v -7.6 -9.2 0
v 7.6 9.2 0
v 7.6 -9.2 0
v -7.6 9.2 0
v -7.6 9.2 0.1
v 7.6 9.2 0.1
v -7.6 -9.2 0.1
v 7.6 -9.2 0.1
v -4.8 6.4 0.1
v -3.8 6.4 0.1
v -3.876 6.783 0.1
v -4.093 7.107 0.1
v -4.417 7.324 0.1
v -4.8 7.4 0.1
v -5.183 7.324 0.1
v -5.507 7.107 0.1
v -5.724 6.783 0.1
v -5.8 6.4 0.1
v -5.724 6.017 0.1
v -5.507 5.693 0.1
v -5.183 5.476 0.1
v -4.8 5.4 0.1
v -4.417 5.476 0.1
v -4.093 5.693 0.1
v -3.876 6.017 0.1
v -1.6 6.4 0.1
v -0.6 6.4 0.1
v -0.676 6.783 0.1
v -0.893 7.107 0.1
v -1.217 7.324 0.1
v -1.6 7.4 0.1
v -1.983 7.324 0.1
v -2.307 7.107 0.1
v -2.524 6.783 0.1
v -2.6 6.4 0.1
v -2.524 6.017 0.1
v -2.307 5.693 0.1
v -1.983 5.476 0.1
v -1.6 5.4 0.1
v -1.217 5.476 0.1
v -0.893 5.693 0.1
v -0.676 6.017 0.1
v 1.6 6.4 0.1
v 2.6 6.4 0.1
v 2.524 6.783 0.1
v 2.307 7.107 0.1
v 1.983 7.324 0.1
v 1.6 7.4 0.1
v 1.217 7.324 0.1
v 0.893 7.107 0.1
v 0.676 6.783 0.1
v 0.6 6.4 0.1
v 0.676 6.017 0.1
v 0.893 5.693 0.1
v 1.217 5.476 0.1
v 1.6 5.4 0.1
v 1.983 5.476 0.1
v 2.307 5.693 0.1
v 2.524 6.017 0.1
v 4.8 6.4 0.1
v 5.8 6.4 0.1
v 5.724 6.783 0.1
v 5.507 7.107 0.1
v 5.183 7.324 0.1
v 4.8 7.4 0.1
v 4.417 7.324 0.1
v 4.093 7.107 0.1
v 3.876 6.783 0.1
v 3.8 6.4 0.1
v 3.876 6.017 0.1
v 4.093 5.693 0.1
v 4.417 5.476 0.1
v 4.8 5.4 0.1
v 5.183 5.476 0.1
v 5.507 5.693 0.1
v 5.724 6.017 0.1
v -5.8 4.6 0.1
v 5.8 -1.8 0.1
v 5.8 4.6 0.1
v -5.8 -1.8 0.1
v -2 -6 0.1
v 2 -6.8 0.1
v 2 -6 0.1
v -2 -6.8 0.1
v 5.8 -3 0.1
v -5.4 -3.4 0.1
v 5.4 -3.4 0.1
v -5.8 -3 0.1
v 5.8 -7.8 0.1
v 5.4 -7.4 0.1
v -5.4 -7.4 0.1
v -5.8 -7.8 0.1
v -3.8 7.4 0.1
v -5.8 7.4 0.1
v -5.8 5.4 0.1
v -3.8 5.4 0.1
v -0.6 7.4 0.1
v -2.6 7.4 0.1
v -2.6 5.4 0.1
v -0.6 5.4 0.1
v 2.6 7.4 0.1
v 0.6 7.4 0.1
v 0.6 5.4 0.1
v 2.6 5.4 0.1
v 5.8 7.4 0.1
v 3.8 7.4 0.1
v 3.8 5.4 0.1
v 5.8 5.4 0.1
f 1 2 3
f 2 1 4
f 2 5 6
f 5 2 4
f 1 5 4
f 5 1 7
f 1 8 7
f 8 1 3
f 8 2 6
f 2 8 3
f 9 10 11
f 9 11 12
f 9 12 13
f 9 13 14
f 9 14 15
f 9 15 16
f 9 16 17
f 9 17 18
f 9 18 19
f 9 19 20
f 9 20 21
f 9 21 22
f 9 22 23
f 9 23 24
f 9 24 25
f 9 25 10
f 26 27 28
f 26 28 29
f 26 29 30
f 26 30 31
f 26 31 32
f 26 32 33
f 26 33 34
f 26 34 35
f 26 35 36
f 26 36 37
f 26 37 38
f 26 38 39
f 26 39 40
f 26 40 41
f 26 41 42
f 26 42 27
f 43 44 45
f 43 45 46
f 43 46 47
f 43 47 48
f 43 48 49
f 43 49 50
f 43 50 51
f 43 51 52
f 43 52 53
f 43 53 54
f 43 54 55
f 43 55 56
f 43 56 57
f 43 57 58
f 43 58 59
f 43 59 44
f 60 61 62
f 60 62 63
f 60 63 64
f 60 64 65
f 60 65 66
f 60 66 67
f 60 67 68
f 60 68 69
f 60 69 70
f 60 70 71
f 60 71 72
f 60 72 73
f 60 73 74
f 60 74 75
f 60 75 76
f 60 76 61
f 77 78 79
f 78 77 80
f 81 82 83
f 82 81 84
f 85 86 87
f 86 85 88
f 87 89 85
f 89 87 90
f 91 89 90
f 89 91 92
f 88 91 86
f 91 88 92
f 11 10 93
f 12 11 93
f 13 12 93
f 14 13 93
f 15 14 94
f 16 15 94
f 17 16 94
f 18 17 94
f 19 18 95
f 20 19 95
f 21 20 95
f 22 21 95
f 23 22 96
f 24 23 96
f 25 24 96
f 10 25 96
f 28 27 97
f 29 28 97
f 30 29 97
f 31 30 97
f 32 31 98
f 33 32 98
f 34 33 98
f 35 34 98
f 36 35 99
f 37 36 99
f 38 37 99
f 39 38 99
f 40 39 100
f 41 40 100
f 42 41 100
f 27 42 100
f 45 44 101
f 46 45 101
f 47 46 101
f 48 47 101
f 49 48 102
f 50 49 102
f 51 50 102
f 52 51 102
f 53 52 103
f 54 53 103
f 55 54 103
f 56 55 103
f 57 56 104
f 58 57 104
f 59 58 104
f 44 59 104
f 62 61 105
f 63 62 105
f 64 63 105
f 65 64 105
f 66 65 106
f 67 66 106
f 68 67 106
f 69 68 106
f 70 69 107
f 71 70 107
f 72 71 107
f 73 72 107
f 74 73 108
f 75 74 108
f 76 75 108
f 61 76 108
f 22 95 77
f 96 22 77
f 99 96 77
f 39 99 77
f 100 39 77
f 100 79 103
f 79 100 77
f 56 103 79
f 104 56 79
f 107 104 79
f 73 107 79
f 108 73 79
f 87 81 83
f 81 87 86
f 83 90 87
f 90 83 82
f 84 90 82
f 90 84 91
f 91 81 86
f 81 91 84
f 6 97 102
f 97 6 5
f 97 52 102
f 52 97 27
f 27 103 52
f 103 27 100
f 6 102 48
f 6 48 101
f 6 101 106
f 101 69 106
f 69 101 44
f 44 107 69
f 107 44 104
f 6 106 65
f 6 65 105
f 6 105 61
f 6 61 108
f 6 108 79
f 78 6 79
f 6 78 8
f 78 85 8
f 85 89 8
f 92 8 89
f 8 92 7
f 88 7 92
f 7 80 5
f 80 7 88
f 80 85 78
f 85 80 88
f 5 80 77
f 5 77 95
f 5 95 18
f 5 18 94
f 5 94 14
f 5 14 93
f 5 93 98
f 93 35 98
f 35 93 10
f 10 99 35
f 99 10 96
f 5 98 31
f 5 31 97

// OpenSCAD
// file: ../p/box5-12.scad
use <../lib.scad>
function ldraw_lib__box5_12() = [
// 0 Box with 5 Faces without Any Edges
// 0 Name: box5-12.dat
// 0 Author: Chris Dee [cwdee]
// 0 !LDRAW_ORG Primitive UPDATE 2009-02
// 0 !LICENSE Licensed under CC BY 4.0 : see CAreadme.txt
// 
// 0 BFC CERTIFY CCW
  [0,"BFC","CERTIFY"],
  [0,"BFC","CCW"],
// 
// 0 !HISTORY 2009-09-03 [PTadmin] Official Update 2009-02
// 
// 
// 4 16 1 1 1 1 1 -1 -1 1 -1 -1 1 1
  [4,16,1,1,1,1,1,-1,-1,1,-1,-1,1,1],
// 4 16 -1 0 1 1 0 1 1 1 1 -1 1 1
  [4,16,-1,0,1,1,0,1,1,1,1,-1,1,1],
// 4 16 -1 0 -1 -1 0 1 -1 1 1 -1 1 -1
  [4,16,-1,0,-1,-1,0,1,-1,1,1,-1,1,-1],
// 4 16 1 0 -1 -1 0 -1 -1 1 -1 1 1 -1
  [4,16,1,0,-1,-1,0,-1,-1,1,-1,1,1,-1],
// 4 16 1 0 1 1 0 -1 1 1 -1 1 1 1
  [4,16,1,0,1,1,0,-1,1,1,-1,1,1,1],
// 0
];
module ldraw_lib__box5_12(step=0, col=false, unit=2/5, alt=false, line=0.2, solid=!$preview)
    makepoly(ldraw_lib__box5_12(), step=step, col=col, unit=unit, alt=alt, line=line, solid=solid);
ldraw_lib__box5_12(line=0.2);
// file: ../p/4-4ndis.scad
use <../lib.scad>
function ldraw_lib__4_4ndis() = [
// 0 Disc Negative 1.0
// 0 Name: 4-4ndis.dat
// 0 Author: James Jessiman
// 0 !LDRAW_ORG Primitive UPDATE 2012-01
// 0 !LICENSE Licensed under CC BY 4.0 : see CAreadme.txt
// 
// 0 BFC CERTIFY CCW
  [0,"BFC","CERTIFY"],
  [0,"BFC","CCW"],
// 
// 0 !HISTORY 2002-03-23 [sbliss] Added BFC statement; compacted code
// 0 !HISTORY 2002-04-25 [PTadmin] Official Update 2002-02
// 0 !HISTORY 2007-06-24 [PTadmin] Header formatted for Contributor Agreement
// 0 !HISTORY 2008-07-01 [PTadmin] Official Update 2008-01
// 0 !HISTORY 2012-02-16 [Philo] Changed to CCW
// 0 !HISTORY 2012-03-30 [PTadmin] Official Update 2012-01
// 
// 
// 3 16 0.9239 0 0.3827 1 0 0 1 0 1
  [3,16,0.9239,0,0.3827,1,0,0,1,0,1],
// 3 16 0.7071 0 0.7071 0.9239 0 0.3827 1 0 1
  [3,16,0.7071,0,0.7071,0.9239,0,0.3827,1,0,1],
// 3 16 0.3827 0 0.9239 0.7071 0 0.7071 1 0 1
  [3,16,0.3827,0,0.9239,0.7071,0,0.7071,1,0,1],
// 3 16 0 0 1 0.3827 0 0.9239 1 0 1
  [3,16,0,0,1,0.3827,0,0.9239,1,0,1],
// 3 16 -0.3827 0 0.9239 0 0 1 -1 0 1
  [3,16,-0.3827,0,0.9239,0,0,1,-1,0,1],
// 3 16 -0.7071 0 0.7071 -0.3827 0 0.9239 -1 0 1
  [3,16,-0.7071,0,0.7071,-0.3827,0,0.9239,-1,0,1],
// 3 16 -0.9239 0 0.3827 -0.7071 0 0.7071 -1 0 1
  [3,16,-0.9239,0,0.3827,-0.7071,0,0.7071,-1,0,1],
// 3 16 -1 0 0 -0.9239 0 0.3827 -1 0 1
  [3,16,-1,0,0,-0.9239,0,0.3827,-1,0,1],
// 3 16 -0.9239 0 -0.3827 -1 0 0 -1 0 -1
  [3,16,-0.9239,0,-0.3827,-1,0,0,-1,0,-1],
// 3 16 -0.7071 0 -0.7071 -0.9239 0 -0.3827 -1 0 -1
  [3,16,-0.7071,0,-0.7071,-0.9239,0,-0.3827,-1,0,-1],
// 3 16 -0.3827 0 -0.9239 -0.7071 0 -0.7071 -1 0 -1
  [3,16,-0.3827,0,-0.9239,-0.7071,0,-0.7071,-1,0,-1],
// 3 16 0 0 -1 -0.3827 0 -0.9239 -1 0 -1
  [3,16,0,0,-1,-0.3827,0,-0.9239,-1,0,-1],
// 3 16 0.3827 0 -0.9239 0 0 -1 1 0 -1
  [3,16,0.3827,0,-0.9239,0,0,-1,1,0,-1],
// 3 16 0.7071 0 -0.7071 0.3827 0 -0.9239 1 0 -1
  [3,16,0.7071,0,-0.7071,0.3827,0,-0.9239,1,0,-1],
// 3 16 0.9239 0 -0.3827 0.7071 0 -0.7071 1 0 -1
  [3,16,0.9239,0,-0.3827,0.7071,0,-0.7071,1,0,-1],
// 3 16 1 0 0 0.9239 0 -0.3827 1 0 -1
  [3,16,1,0,0,0.9239,0,-0.3827,1,0,-1],
];
module ldraw_lib__4_4ndis(step=0, col=false, unit=2/5, alt=false, line=0.2, solid=!$preview)
    makepoly(ldraw_lib__4_4ndis(), step=step, col=col, unit=unit, alt=alt, line=line, solid=solid);
ldraw_lib__4_4ndis(line=0.2);
// file: ../p/4-4disc.scad
use <../lib.scad>
function ldraw_lib__4_4disc() = [
// 0 Disc 1.0
// 0 Name: 4-4disc.dat
// 0 Author: James Jessiman
// 0 !LDRAW_ORG Primitive UPDATE 2002-02
// 0 !LICENSE Licensed under CC BY 4.0 : see CAreadme.txt
// 
// 0 BFC CERTIFY CCW
  [0,"BFC","CERTIFY"],
  [0,"BFC","CCW"],
// 
// 0 !HISTORY 1998-12-15 [PTadmin] Official Update 1998-10
// 0 !HISTORY 2002-03-23 [sbliss] Added BFC statement
// 0 !HISTORY 2002-04-25 [PTadmin] Official Update 2002-02
// 0 !HISTORY 2007-06-24 [PTadmin] Header formatted for Contributor Agreement
// 0 !HISTORY 2008-07-01 [PTadmin] Official Update 2008-01
// 
// 
// 3 16 0 0 0 1 0 0 0.9239 0 0.3827
  [3,16,0,0,0,1,0,0,0.9239,0,0.3827],
// 3 16 0 0 0 0.9239 0 0.3827 0.7071 0 0.7071
  [3,16,0,0,0,0.9239,0,0.3827,0.7071,0,0.7071],
// 3 16 0 0 0 0.7071 0 0.7071 0.3827 0 0.9239
  [3,16,0,0,0,0.7071,0,0.7071,0.3827,0,0.9239],
// 3 16 0 0 0 0.3827 0 0.9239 0 0 1
  [3,16,0,0,0,0.3827,0,0.9239,0,0,1],
// 3 16 0 0 0 0 0 1 -0.3827 0 0.9239
  [3,16,0,0,0,0,0,1,-0.3827,0,0.9239],
// 3 16 0 0 0 -0.3827 0 0.9239 -0.7071 0 0.7071
  [3,16,0,0,0,-0.3827,0,0.9239,-0.7071,0,0.7071],
// 3 16 0 0 0 -0.7071 0 0.7071 -0.9239 0 0.3827
  [3,16,0,0,0,-0.7071,0,0.7071,-0.9239,0,0.3827],
// 3 16 0 0 0 -0.9239 0 0.3827 -1 0 -0
  [3,16,0,0,0,-0.9239,0,0.3827,-1,0,-0],
// 3 16 0 0 0 -1 0 -0 -0.9239 0 -0.3827
  [3,16,0,0,0,-1,0,-0,-0.9239,0,-0.3827],
// 3 16 0 0 0 -0.9239 0 -0.3827 -0.7071 0 -0.7071
  [3,16,0,0,0,-0.9239,0,-0.3827,-0.7071,0,-0.7071],
// 3 16 0 0 0 -0.7071 0 -0.7071 -0.3827 0 -0.9239
  [3,16,0,0,0,-0.7071,0,-0.7071,-0.3827,0,-0.9239],
// 3 16 0 0 0 -0.3827 0 -0.9239 0 0 -1
  [3,16,0,0,0,-0.3827,0,-0.9239,0,0,-1],
// 3 16 0 0 0 0 0 -1 0.3827 0 -0.9239
  [3,16,0,0,0,0,0,-1,0.3827,0,-0.9239],
// 3 16 0 0 0 0.3827 0 -0.9239 0.7071 0 -0.7071
  [3,16,0,0,0,0.3827,0,-0.9239,0.7071,0,-0.7071],
// 3 16 0 0 0 0.7071 0 -0.7071 0.9239 0 -0.3827
  [3,16,0,0,0,0.7071,0,-0.7071,0.9239,0,-0.3827],
// 3 16 0 0 0 0.9239 0 -0.3827 1 0 0
  [3,16,0,0,0,0.9239,0,-0.3827,1,0,0],
// 0
];
module ldraw_lib__4_4disc(step=0, col=false, unit=2/5, alt=false, line=0.2, solid=!$preview)
    makepoly(ldraw_lib__4_4disc(), step=step, col=col, unit=unit, alt=alt, line=line, solid=solid);
ldraw_lib__4_4disc(line=0.2);
// main file
use <../lib.scad>
use <../p/4-4disc.scad>
use <../p/4-4ndis.scad>
use <../p/box5-12.scad>
function ldraw_lib__195375c() = [
// 0 Sticker  2.3 x  1.9 with Oven on Transparent Background
// 0 Name: 195375c.dat
// 0 Author: Takeshi Takahashi [RainbowDolphin]
// 0 !LDRAW_ORG Part UPDATE 2024-11
// 0 !LICENSE Licensed under CC BY 4.0 : see CAreadme.txt
// 
// 0 BFC CERTIFY CCW
  [0,"BFC","CERTIFY"],
  [0,"BFC","CCW"],
// 
// 0 !KEYWORDS Kitchen, Set 6374
// 
// 0 !HISTORY 2024-12-30 [OrionP] Official Update 2024-11
// 
// 
// 1 16 0 -0.25 0 19 0 0 0 0.25 0 0 0 23 box5-12.dat
  [1,16,0,-0.25,0,19,0,0,0,0.25,0,0,0,23, ldraw_lib__box5_12()],
// 0 BFC NOCLIP
  [0,"BFC","NOCLIP"],
// 1 0 -12 -0.25 16 2.5 0 0 0 1 0 0 0 2.5 4-4disc.dat
  [1,0,-12,-0.25,16,2.5,0,0,0,1,0,0,0,2.5, ldraw_lib__4_4disc()],
// 1 0 -4 -0.25 16 2.5 0 0 0 1 0 0 0 2.5 4-4disc.dat
  [1,0,-4,-0.25,16,2.5,0,0,0,1,0,0,0,2.5, ldraw_lib__4_4disc()],
// 1 0 4 -0.25 16 2.5 0 0 0 1 0 0 0 2.5 4-4disc.dat
  [1,0,4,-0.25,16,2.5,0,0,0,1,0,0,0,2.5, ldraw_lib__4_4disc()],
// 1 0 12 -0.25 16 2.5 0 0 0 1 0 0 0 2.5 4-4disc.dat
  [1,0,12,-0.25,16,2.5,0,0,0,1,0,0,0,2.5, ldraw_lib__4_4disc()],
// 4 0 14.5 -0.25 11.5 -14.5 -0.25 11.5 -14.5 -0.25 -4.5 14.5 -0.25 -4.5
  [4,0,14.5,-0.25,11.5,-14.5,-0.25,11.5,-14.5,-0.25,-4.5,14.5,-0.25,-4.5],
// 4 0 5 -0.25 -15 -5 -0.25 -15 -5 -0.25 -17 5 -0.25 -17
  [4,0,5,-0.25,-15,-5,-0.25,-15,-5,-0.25,-17,5,-0.25,-17],
// 4 0 14.5 -0.25 -7.5 -14.5 -0.25 -7.5 -13.5 -0.25 -8.5 13.5 -0.25 -8.5
  [4,0,14.5,-0.25,-7.5,-14.5,-0.25,-7.5,-13.5,-0.25,-8.5,13.5,-0.25,-8.5],
// 4 0 14.5 -0.25 -19.5 14.5 -0.25 -7.5 13.5 -0.25 -8.5 13.5 -0.25 -18.5
  [4,0,14.5,-0.25,-19.5,14.5,-0.25,-7.5,13.5,-0.25,-8.5,13.5,-0.25,-18.5],
// 4 0 -14.5 -0.25 -19.5 14.5 -0.25 -19.5 13.5 -0.25 -18.5 -13.5 -0.25 -18.5
  [4,0,-14.5,-0.25,-19.5,14.5,-0.25,-19.5,13.5,-0.25,-18.5,-13.5,-0.25,-18.5],
// 4 0 -14.5 -0.25 -7.5 -14.5 -0.25 -19.5 -13.5 -0.25 -18.5 -13.5 -0.25 -8.5
  [4,0,-14.5,-0.25,-7.5,-14.5,-0.25,-19.5,-13.5,-0.25,-18.5,-13.5,-0.25,-8.5],
// 0 BFC CLIP
  [0,"BFC","CLIP"],
// 1 16 -12 -0.25 16 2.5 0 0 0 1 0 0 0 2.5 4-4ndis.dat
  [1,16,-12,-0.25,16,2.5,0,0,0,1,0,0,0,2.5, ldraw_lib__4_4ndis()],
// 1 16 -4 -0.25 16 2.5 0 0 0 1 0 0 0 2.5 4-4ndis.dat
  [1,16,-4,-0.25,16,2.5,0,0,0,1,0,0,0,2.5, ldraw_lib__4_4ndis()],
// 1 16 4 -0.25 16 2.5 0 0 0 1 0 0 0 2.5 4-4ndis.dat
  [1,16,4,-0.25,16,2.5,0,0,0,1,0,0,0,2.5, ldraw_lib__4_4ndis()],
// 1 16 12 -0.25 16 2.5 0 0 0 1 0 0 0 2.5 4-4ndis.dat
  [1,16,12,-0.25,16,2.5,0,0,0,1,0,0,0,2.5, ldraw_lib__4_4ndis()],
// 3 16 -12 -0.25 13.5 -14.5 -0.25 13.5 -14.5 -0.25 11.5
  [3,16,-12,-0.25,13.5,-14.5,-0.25,13.5,-14.5,-0.25,11.5],
// 3 16 -9.5 -0.25 13.5 -12 -0.25 13.5 -14.5 -0.25 11.5
  [3,16,-9.5,-0.25,13.5,-12,-0.25,13.5,-14.5,-0.25,11.5],
// 3 16 -6.5 -0.25 13.5 -9.5 -0.25 13.5 -14.5 -0.25 11.5
  [3,16,-6.5,-0.25,13.5,-9.5,-0.25,13.5,-14.5,-0.25,11.5],
// 3 16 -4 -0.25 13.5 -6.5 -0.25 13.5 -14.5 -0.25 11.5
  [3,16,-4,-0.25,13.5,-6.5,-0.25,13.5,-14.5,-0.25,11.5],
// 3 16 -1.5 -0.25 13.5 -4 -0.25 13.5 -14.5 -0.25 11.5
  [3,16,-1.5,-0.25,13.5,-4,-0.25,13.5,-14.5,-0.25,11.5],
// 4 16 1.5 -0.25 13.5 -1.5 -0.25 13.5 -14.5 -0.25 11.5 14.5 -0.25 11.5
  [4,16,1.5,-0.25,13.5,-1.5,-0.25,13.5,-14.5,-0.25,11.5,14.5,-0.25,11.5],
// 3 16 4 -0.25 13.5 1.5 -0.25 13.5 14.5 -0.25 11.5
  [3,16,4,-0.25,13.5,1.5,-0.25,13.5,14.5,-0.25,11.5],
// 3 16 6.5 -0.25 13.5 4 -0.25 13.5 14.5 -0.25 11.5
  [3,16,6.5,-0.25,13.5,4,-0.25,13.5,14.5,-0.25,11.5],
// 3 16 9.5 -0.25 13.5 6.5 -0.25 13.5 14.5 -0.25 11.5
  [3,16,9.5,-0.25,13.5,6.5,-0.25,13.5,14.5,-0.25,11.5],
// 3 16 12 -0.25 13.5 9.5 -0.25 13.5 14.5 -0.25 11.5
  [3,16,12,-0.25,13.5,9.5,-0.25,13.5,14.5,-0.25,11.5],
// 3 16 14.5 -0.25 13.5 12 -0.25 13.5 14.5 -0.25 11.5
  [3,16,14.5,-0.25,13.5,12,-0.25,13.5,14.5,-0.25,11.5],
// 4 16 13.5 -0.25 -8.5 -13.5 -0.25 -8.5 -5 -0.25 -15 5 -0.25 -15
  [4,16,13.5,-0.25,-8.5,-13.5,-0.25,-8.5,-5,-0.25,-15,5,-0.25,-15],
// 4 16 13.5 -0.25 -8.5 5 -0.25 -15 5 -0.25 -17 13.5 -0.25 -18.5
  [4,16,13.5,-0.25,-8.5,5,-0.25,-15,5,-0.25,-17,13.5,-0.25,-18.5],
// 4 16 13.5 -0.25 -18.5 5 -0.25 -17 -5 -0.25 -17 -13.5 -0.25 -18.5
  [4,16,13.5,-0.25,-18.5,5,-0.25,-17,-5,-0.25,-17,-13.5,-0.25,-18.5],
// 4 16 -13.5 -0.25 -8.5 -13.5 -0.25 -18.5 -5 -0.25 -17 -5 -0.25 -15
  [4,16,-13.5,-0.25,-8.5,-13.5,-0.25,-18.5,-5,-0.25,-17,-5,-0.25,-15],
// 4 16 19 -0.25 23 -19 -0.25 23 -1.5 -0.25 18.5 1.5 -0.25 18.5
  [4,16,19,-0.25,23,-19,-0.25,23,-1.5,-0.25,18.5,1.5,-0.25,18.5],
// 4 16 1.5 -0.25 18.5 -1.5 -0.25 18.5 -1.5 -0.25 16 1.5 -0.25 16
  [4,16,1.5,-0.25,18.5,-1.5,-0.25,18.5,-1.5,-0.25,16,1.5,-0.25,16],
// 4 16 1.5 -0.25 16 -1.5 -0.25 16 -1.5 -0.25 13.5 1.5 -0.25 13.5
  [4,16,1.5,-0.25,16,-1.5,-0.25,16,-1.5,-0.25,13.5,1.5,-0.25,13.5],
// 3 16 19 -0.25 23 1.5 -0.25 18.5 4 -0.25 18.5
  [3,16,19,-0.25,23,1.5,-0.25,18.5,4,-0.25,18.5],
// 3 16 19 -0.25 23 4 -0.25 18.5 6.5 -0.25 18.5
  [3,16,19,-0.25,23,4,-0.25,18.5,6.5,-0.25,18.5],
// 3 16 19 -0.25 23 6.5 -0.25 18.5 9.5 -0.25 18.5
  [3,16,19,-0.25,23,6.5,-0.25,18.5,9.5,-0.25,18.5],
// 4 16 9.5 -0.25 18.5 6.5 -0.25 18.5 6.5 -0.25 16 9.5 -0.25 16
  [4,16,9.5,-0.25,18.5,6.5,-0.25,18.5,6.5,-0.25,16,9.5,-0.25,16],
// 4 16 9.5 -0.25 16 6.5 -0.25 16 6.5 -0.25 13.5 9.5 -0.25 13.5
  [4,16,9.5,-0.25,16,6.5,-0.25,16,6.5,-0.25,13.5,9.5,-0.25,13.5],
// 3 16 19 -0.25 23 9.5 -0.25 18.5 12 -0.25 18.5
  [3,16,19,-0.25,23,9.5,-0.25,18.5,12,-0.25,18.5],
// 3 16 19 -0.25 23 12 -0.25 18.5 14.5 -0.25 18.5
  [3,16,19,-0.25,23,12,-0.25,18.5,14.5,-0.25,18.5],
// 3 16 19 -0.25 23 14.5 -0.25 18.5 14.5 -0.25 16
  [3,16,19,-0.25,23,14.5,-0.25,18.5,14.5,-0.25,16],
// 3 16 19 -0.25 23 14.5 -0.25 16 14.5 -0.25 13.5
  [3,16,19,-0.25,23,14.5,-0.25,16,14.5,-0.25,13.5],
// 3 16 19 -0.25 23 14.5 -0.25 13.5 14.5 -0.25 11.5
  [3,16,19,-0.25,23,14.5,-0.25,13.5,14.5,-0.25,11.5],
// 4 16 19 -0.25 23 14.5 -0.25 11.5 14.5 -0.25 -4.5 19 -0.25 -23
  [4,16,19,-0.25,23,14.5,-0.25,11.5,14.5,-0.25,-4.5,19,-0.25,-23],
// 3 16 14.5 -0.25 -4.5 14.5 -0.25 -7.5 19 -0.25 -23
  [3,16,14.5,-0.25,-4.5,14.5,-0.25,-7.5,19,-0.25,-23],
// 3 16 14.5 -0.25 -7.5 14.5 -0.25 -19.5 19 -0.25 -23
  [3,16,14.5,-0.25,-7.5,14.5,-0.25,-19.5,19,-0.25,-23],
// 4 16 19 -0.25 -23 14.5 -0.25 -19.5 -14.5 -0.25 -19.5 -19 -0.25 -23
  [4,16,19,-0.25,-23,14.5,-0.25,-19.5,-14.5,-0.25,-19.5,-19,-0.25,-23],
// 3 16 -14.5 -0.25 -7.5 -19 -0.25 -23 -14.5 -0.25 -19.5
  [3,16,-14.5,-0.25,-7.5,-19,-0.25,-23,-14.5,-0.25,-19.5],
// 4 16 -19 -0.25 -23 -14.5 -0.25 -7.5 -14.5 -0.25 -4.5 -19 -0.25 23
  [4,16,-19,-0.25,-23,-14.5,-0.25,-7.5,-14.5,-0.25,-4.5,-19,-0.25,23],
// 4 16 14.5 -0.25 -4.5 -14.5 -0.25 -4.5 -14.5 -0.25 -7.5 14.5 -0.25 -7.5
  [4,16,14.5,-0.25,-4.5,-14.5,-0.25,-4.5,-14.5,-0.25,-7.5,14.5,-0.25,-7.5],
// 3 16 -19 -0.25 23 -14.5 -0.25 -4.5 -14.5 -0.25 11.5
  [3,16,-19,-0.25,23,-14.5,-0.25,-4.5,-14.5,-0.25,11.5],
// 3 16 -19 -0.25 23 -14.5 -0.25 11.5 -14.5 -0.25 13.5
  [3,16,-19,-0.25,23,-14.5,-0.25,11.5,-14.5,-0.25,13.5],
// 3 16 -19 -0.25 23 -14.5 -0.25 13.5 -14.5 -0.25 16
  [3,16,-19,-0.25,23,-14.5,-0.25,13.5,-14.5,-0.25,16],
// 3 16 -19 -0.25 23 -14.5 -0.25 16 -14.5 -0.25 18.5
  [3,16,-19,-0.25,23,-14.5,-0.25,16,-14.5,-0.25,18.5],
// 3 16 -19 -0.25 23 -14.5 -0.25 18.5 -12 -0.25 18.5
  [3,16,-19,-0.25,23,-14.5,-0.25,18.5,-12,-0.25,18.5],
// 3 16 -19 -0.25 23 -12 -0.25 18.5 -9.5 -0.25 18.5
  [3,16,-19,-0.25,23,-12,-0.25,18.5,-9.5,-0.25,18.5],
// 3 16 -19 -0.25 23 -9.5 -0.25 18.5 -6.5 -0.25 18.5
  [3,16,-19,-0.25,23,-9.5,-0.25,18.5,-6.5,-0.25,18.5],
// 4 16 -6.5 -0.25 18.5 -9.5 -0.25 18.5 -9.5 -0.25 16 -6.5 -0.25 16
  [4,16,-6.5,-0.25,18.5,-9.5,-0.25,18.5,-9.5,-0.25,16,-6.5,-0.25,16],
// 4 16 -6.5 -0.25 16 -9.5 -0.25 16 -9.5 -0.25 13.5 -6.5 -0.25 13.5
  [4,16,-6.5,-0.25,16,-9.5,-0.25,16,-9.5,-0.25,13.5,-6.5,-0.25,13.5],
// 3 16 -19 -0.25 23 -6.5 -0.25 18.5 -4 -0.25 18.5
  [3,16,-19,-0.25,23,-6.5,-0.25,18.5,-4,-0.25,18.5],
// 3 16 -19 -0.25 23 -4 -0.25 18.5 -1.5 -0.25 18.5
  [3,16,-19,-0.25,23,-4,-0.25,18.5,-1.5,-0.25,18.5],
];
module ldraw_lib__195375c(step=0, col=false, unit=2/5, alt=false, line=0.2, solid=!$preview)
    makepoly(ldraw_lib__195375c(), step=step, col=col, unit=unit, alt=alt, line=line, solid=solid);
ldraw_lib__195375c(line=0.2);
